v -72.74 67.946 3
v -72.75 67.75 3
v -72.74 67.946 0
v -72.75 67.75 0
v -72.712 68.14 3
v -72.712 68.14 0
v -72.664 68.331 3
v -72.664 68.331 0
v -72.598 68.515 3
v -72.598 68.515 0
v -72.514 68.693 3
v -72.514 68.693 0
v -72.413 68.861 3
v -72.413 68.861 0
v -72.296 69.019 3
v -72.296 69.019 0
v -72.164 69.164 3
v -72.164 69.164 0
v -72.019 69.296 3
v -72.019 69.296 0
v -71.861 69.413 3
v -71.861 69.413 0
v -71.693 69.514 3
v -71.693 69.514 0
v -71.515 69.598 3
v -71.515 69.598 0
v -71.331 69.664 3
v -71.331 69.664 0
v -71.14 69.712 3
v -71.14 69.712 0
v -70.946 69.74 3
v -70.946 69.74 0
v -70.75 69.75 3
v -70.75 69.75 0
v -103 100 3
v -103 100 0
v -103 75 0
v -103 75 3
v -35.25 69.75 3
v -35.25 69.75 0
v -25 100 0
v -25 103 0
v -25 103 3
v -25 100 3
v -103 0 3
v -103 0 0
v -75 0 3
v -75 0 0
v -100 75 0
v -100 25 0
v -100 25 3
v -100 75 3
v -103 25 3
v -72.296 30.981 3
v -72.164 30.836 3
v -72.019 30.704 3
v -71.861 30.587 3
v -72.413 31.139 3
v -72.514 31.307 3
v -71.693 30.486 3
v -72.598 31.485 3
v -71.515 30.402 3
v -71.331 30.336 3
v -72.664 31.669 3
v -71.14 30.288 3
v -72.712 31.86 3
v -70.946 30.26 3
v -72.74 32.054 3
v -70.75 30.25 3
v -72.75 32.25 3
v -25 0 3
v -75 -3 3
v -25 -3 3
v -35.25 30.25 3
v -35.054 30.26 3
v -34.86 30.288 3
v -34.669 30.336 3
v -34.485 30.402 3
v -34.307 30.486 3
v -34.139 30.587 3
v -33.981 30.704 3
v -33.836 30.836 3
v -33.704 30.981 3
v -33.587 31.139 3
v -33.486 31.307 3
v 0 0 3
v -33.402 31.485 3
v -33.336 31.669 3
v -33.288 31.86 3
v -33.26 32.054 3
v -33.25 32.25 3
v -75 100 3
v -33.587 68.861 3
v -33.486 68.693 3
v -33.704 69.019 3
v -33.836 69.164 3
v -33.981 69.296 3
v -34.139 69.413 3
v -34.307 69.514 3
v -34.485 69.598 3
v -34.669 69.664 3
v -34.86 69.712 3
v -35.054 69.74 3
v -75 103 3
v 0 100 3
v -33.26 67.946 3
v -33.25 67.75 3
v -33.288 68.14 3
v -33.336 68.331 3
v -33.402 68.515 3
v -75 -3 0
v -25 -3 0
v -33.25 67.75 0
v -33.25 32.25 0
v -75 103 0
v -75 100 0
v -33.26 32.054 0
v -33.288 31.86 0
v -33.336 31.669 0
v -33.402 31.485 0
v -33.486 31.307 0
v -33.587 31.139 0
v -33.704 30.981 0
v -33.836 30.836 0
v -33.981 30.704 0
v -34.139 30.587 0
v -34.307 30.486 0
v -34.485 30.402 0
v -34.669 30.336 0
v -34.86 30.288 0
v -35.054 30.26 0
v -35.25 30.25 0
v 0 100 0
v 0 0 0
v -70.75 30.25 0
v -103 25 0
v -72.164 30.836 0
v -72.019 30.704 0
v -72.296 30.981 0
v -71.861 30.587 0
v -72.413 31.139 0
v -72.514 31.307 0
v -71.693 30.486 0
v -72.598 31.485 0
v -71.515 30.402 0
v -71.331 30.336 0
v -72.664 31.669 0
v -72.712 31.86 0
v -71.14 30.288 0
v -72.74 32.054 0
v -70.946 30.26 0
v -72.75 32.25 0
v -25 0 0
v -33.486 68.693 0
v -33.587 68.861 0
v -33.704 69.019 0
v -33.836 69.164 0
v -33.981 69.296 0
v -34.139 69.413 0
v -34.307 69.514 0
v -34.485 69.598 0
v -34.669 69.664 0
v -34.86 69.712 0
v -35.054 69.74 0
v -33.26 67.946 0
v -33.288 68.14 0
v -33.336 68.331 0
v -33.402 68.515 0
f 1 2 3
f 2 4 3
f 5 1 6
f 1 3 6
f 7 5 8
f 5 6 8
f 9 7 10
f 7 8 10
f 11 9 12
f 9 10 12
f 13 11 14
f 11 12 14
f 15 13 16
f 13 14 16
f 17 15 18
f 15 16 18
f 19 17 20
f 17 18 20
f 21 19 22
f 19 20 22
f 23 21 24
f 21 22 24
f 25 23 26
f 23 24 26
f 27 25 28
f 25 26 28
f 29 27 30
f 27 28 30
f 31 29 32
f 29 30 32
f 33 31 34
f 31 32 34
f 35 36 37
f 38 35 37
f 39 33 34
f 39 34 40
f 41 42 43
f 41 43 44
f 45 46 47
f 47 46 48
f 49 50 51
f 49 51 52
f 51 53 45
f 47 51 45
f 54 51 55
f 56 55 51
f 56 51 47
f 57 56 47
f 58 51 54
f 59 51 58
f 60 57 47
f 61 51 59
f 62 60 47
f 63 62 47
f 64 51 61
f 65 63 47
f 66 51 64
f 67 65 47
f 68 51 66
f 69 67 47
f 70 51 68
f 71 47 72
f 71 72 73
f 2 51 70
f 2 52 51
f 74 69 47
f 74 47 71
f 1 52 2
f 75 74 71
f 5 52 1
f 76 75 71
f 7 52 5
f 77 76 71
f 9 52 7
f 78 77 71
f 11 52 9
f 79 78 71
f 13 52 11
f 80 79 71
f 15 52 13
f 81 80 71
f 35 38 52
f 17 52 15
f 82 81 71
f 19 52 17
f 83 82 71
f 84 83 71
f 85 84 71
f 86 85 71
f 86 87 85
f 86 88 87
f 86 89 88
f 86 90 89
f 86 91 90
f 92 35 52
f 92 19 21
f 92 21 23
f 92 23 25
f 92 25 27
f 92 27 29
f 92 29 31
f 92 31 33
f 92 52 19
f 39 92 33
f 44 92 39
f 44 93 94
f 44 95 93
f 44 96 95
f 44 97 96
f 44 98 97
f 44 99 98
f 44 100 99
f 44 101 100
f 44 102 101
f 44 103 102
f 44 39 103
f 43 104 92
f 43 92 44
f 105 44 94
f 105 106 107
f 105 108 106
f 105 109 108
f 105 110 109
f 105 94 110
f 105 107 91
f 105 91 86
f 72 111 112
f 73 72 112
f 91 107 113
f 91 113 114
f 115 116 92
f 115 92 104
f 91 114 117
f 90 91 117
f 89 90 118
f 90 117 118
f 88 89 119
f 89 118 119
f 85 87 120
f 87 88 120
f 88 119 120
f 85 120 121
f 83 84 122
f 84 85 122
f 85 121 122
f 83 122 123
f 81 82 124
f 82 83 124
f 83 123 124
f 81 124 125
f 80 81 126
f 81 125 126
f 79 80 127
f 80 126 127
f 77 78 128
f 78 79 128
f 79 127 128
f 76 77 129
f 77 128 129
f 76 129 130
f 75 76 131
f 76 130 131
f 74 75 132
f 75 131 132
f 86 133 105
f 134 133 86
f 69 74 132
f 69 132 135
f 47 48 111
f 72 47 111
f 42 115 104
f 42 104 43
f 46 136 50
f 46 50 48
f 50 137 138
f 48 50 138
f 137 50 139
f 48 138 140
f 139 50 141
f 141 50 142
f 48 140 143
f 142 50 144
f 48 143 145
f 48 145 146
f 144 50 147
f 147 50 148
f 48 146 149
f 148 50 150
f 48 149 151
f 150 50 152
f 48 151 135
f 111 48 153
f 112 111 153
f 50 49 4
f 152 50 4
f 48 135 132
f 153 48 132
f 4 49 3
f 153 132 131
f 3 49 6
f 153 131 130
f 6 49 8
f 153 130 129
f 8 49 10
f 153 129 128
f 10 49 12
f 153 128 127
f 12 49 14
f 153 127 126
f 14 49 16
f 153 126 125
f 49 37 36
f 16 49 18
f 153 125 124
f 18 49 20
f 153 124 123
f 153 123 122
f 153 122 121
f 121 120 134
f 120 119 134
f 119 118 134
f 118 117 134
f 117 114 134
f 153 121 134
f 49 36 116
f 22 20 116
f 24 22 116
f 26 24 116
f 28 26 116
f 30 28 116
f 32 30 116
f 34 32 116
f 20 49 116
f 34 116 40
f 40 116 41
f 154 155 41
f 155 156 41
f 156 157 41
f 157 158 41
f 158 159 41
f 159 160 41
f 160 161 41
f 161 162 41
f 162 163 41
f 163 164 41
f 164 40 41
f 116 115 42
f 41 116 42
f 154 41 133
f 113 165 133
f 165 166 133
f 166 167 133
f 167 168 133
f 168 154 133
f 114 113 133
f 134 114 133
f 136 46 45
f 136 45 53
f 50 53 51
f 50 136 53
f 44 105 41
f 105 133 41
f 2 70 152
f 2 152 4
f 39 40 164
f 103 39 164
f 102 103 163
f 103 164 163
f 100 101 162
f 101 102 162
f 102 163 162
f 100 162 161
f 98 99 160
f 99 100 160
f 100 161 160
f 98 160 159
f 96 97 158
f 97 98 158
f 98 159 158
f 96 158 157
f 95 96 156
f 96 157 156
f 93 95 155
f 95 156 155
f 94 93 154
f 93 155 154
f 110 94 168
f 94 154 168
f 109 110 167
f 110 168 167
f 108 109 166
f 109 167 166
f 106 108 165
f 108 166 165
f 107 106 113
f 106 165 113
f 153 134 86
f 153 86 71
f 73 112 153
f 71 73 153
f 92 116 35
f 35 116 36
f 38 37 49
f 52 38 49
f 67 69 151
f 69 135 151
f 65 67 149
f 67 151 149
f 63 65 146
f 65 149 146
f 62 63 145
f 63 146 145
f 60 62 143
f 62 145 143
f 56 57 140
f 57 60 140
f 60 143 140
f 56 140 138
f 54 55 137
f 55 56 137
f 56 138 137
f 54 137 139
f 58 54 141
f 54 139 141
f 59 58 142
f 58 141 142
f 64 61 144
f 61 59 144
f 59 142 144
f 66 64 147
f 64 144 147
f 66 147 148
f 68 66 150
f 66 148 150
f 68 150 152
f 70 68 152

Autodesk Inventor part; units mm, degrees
ref_plane "YZ Plane" through (0, 0, 0) normal (1, 0, 0) x (0, 1, 0)
ref_plane "XZ Plane" through (0, 0, 0) normal (0, 1, 0) x (-1, 0, 0)
ref_plane "XY Plane" through (0, 0, 0) normal (0, 0, 1) x (1, 0, 0)
sketch "Boceto1" plane through (0, 0, 0) normal (0, 0, 1) x (1, 0, 0)
  line L0 (0, 100) -> (0, 0)
  line L1 (-100, 25) -> (-100, 75)
  line L2 (-75, 0) -> (-75, -3)
  line L3 (-75, -3) -> (-25, -3)
  line L4 (-25, -3) -> (-25, 0)
  line L5 (0, 0) -> (-25, 0)
  line L6 (-103, 100) -> (-103, 75)
  line L7 (-103, 75) -> (-100, 75)
  line L8 (-103, 0) -> (-103, 25)
  line L9 (-103, 25) -> (-100, 25)
  line L10 (-103, 0) -> (-75, 0)
  line L11 (-75, 100) -> (-75, 103)
  line L12 (-75, 103) -> (-25, 103)
  line L13 (-25, 103) -> (-25, 100)
  line L14 (0, 100) -> (-25, 100)
  line L15 (-75, 100) -> (-103, 100)
  dimension "d1" = 100
  dimension "d4" = 50
  dimension "d5" = 25
  dimension "d7" = 25
  dimension "d8" = 25
  dimension "d9" = 3
  dimension "d10" = 3
  dimension "d11" = 100
  dimension "d13" = 50
  dimension "d14" = 3
extrude "Extrusión2" add sketch "Boceto1" along normal blind 3
sketch "Boceto2" plane through (0, 0, 3) normal (0, 0, 1) x (1, 0, 0)
  line L0 (-75, 100) -> (-103, 100) projected
  line L1 (-72.75, 69.75) -> (-33.25, 69.75)
  line L2 (-33.25, 69.75) -> (-33.25, 30.25)
  line L3 (-33.25, 30.25) -> (-72.75, 30.25)
  line L4 (-72.75, 30.25) -> (-72.75, 69.75)
  line L5 (-103, 25) -> (-103, 0) projected
  point P0 (0, 0)
  dimension "d37" = 39.5
  dimension "d38" = 39.5
  dimension "d39" = 30.25
  dimension "d40" = 30.25
extrude "Extrusión3" cut sketch "Boceto2" against normal blind 3
fillet "Empalme1" radius 2 4 edges at (-72.75, 69.75, 1.5) (-33.25, 69.75, 1.5) (-33.25, 30.25, 1.5) (-72.75, 30.25, 1.5)
properties part number "Control lateral"
